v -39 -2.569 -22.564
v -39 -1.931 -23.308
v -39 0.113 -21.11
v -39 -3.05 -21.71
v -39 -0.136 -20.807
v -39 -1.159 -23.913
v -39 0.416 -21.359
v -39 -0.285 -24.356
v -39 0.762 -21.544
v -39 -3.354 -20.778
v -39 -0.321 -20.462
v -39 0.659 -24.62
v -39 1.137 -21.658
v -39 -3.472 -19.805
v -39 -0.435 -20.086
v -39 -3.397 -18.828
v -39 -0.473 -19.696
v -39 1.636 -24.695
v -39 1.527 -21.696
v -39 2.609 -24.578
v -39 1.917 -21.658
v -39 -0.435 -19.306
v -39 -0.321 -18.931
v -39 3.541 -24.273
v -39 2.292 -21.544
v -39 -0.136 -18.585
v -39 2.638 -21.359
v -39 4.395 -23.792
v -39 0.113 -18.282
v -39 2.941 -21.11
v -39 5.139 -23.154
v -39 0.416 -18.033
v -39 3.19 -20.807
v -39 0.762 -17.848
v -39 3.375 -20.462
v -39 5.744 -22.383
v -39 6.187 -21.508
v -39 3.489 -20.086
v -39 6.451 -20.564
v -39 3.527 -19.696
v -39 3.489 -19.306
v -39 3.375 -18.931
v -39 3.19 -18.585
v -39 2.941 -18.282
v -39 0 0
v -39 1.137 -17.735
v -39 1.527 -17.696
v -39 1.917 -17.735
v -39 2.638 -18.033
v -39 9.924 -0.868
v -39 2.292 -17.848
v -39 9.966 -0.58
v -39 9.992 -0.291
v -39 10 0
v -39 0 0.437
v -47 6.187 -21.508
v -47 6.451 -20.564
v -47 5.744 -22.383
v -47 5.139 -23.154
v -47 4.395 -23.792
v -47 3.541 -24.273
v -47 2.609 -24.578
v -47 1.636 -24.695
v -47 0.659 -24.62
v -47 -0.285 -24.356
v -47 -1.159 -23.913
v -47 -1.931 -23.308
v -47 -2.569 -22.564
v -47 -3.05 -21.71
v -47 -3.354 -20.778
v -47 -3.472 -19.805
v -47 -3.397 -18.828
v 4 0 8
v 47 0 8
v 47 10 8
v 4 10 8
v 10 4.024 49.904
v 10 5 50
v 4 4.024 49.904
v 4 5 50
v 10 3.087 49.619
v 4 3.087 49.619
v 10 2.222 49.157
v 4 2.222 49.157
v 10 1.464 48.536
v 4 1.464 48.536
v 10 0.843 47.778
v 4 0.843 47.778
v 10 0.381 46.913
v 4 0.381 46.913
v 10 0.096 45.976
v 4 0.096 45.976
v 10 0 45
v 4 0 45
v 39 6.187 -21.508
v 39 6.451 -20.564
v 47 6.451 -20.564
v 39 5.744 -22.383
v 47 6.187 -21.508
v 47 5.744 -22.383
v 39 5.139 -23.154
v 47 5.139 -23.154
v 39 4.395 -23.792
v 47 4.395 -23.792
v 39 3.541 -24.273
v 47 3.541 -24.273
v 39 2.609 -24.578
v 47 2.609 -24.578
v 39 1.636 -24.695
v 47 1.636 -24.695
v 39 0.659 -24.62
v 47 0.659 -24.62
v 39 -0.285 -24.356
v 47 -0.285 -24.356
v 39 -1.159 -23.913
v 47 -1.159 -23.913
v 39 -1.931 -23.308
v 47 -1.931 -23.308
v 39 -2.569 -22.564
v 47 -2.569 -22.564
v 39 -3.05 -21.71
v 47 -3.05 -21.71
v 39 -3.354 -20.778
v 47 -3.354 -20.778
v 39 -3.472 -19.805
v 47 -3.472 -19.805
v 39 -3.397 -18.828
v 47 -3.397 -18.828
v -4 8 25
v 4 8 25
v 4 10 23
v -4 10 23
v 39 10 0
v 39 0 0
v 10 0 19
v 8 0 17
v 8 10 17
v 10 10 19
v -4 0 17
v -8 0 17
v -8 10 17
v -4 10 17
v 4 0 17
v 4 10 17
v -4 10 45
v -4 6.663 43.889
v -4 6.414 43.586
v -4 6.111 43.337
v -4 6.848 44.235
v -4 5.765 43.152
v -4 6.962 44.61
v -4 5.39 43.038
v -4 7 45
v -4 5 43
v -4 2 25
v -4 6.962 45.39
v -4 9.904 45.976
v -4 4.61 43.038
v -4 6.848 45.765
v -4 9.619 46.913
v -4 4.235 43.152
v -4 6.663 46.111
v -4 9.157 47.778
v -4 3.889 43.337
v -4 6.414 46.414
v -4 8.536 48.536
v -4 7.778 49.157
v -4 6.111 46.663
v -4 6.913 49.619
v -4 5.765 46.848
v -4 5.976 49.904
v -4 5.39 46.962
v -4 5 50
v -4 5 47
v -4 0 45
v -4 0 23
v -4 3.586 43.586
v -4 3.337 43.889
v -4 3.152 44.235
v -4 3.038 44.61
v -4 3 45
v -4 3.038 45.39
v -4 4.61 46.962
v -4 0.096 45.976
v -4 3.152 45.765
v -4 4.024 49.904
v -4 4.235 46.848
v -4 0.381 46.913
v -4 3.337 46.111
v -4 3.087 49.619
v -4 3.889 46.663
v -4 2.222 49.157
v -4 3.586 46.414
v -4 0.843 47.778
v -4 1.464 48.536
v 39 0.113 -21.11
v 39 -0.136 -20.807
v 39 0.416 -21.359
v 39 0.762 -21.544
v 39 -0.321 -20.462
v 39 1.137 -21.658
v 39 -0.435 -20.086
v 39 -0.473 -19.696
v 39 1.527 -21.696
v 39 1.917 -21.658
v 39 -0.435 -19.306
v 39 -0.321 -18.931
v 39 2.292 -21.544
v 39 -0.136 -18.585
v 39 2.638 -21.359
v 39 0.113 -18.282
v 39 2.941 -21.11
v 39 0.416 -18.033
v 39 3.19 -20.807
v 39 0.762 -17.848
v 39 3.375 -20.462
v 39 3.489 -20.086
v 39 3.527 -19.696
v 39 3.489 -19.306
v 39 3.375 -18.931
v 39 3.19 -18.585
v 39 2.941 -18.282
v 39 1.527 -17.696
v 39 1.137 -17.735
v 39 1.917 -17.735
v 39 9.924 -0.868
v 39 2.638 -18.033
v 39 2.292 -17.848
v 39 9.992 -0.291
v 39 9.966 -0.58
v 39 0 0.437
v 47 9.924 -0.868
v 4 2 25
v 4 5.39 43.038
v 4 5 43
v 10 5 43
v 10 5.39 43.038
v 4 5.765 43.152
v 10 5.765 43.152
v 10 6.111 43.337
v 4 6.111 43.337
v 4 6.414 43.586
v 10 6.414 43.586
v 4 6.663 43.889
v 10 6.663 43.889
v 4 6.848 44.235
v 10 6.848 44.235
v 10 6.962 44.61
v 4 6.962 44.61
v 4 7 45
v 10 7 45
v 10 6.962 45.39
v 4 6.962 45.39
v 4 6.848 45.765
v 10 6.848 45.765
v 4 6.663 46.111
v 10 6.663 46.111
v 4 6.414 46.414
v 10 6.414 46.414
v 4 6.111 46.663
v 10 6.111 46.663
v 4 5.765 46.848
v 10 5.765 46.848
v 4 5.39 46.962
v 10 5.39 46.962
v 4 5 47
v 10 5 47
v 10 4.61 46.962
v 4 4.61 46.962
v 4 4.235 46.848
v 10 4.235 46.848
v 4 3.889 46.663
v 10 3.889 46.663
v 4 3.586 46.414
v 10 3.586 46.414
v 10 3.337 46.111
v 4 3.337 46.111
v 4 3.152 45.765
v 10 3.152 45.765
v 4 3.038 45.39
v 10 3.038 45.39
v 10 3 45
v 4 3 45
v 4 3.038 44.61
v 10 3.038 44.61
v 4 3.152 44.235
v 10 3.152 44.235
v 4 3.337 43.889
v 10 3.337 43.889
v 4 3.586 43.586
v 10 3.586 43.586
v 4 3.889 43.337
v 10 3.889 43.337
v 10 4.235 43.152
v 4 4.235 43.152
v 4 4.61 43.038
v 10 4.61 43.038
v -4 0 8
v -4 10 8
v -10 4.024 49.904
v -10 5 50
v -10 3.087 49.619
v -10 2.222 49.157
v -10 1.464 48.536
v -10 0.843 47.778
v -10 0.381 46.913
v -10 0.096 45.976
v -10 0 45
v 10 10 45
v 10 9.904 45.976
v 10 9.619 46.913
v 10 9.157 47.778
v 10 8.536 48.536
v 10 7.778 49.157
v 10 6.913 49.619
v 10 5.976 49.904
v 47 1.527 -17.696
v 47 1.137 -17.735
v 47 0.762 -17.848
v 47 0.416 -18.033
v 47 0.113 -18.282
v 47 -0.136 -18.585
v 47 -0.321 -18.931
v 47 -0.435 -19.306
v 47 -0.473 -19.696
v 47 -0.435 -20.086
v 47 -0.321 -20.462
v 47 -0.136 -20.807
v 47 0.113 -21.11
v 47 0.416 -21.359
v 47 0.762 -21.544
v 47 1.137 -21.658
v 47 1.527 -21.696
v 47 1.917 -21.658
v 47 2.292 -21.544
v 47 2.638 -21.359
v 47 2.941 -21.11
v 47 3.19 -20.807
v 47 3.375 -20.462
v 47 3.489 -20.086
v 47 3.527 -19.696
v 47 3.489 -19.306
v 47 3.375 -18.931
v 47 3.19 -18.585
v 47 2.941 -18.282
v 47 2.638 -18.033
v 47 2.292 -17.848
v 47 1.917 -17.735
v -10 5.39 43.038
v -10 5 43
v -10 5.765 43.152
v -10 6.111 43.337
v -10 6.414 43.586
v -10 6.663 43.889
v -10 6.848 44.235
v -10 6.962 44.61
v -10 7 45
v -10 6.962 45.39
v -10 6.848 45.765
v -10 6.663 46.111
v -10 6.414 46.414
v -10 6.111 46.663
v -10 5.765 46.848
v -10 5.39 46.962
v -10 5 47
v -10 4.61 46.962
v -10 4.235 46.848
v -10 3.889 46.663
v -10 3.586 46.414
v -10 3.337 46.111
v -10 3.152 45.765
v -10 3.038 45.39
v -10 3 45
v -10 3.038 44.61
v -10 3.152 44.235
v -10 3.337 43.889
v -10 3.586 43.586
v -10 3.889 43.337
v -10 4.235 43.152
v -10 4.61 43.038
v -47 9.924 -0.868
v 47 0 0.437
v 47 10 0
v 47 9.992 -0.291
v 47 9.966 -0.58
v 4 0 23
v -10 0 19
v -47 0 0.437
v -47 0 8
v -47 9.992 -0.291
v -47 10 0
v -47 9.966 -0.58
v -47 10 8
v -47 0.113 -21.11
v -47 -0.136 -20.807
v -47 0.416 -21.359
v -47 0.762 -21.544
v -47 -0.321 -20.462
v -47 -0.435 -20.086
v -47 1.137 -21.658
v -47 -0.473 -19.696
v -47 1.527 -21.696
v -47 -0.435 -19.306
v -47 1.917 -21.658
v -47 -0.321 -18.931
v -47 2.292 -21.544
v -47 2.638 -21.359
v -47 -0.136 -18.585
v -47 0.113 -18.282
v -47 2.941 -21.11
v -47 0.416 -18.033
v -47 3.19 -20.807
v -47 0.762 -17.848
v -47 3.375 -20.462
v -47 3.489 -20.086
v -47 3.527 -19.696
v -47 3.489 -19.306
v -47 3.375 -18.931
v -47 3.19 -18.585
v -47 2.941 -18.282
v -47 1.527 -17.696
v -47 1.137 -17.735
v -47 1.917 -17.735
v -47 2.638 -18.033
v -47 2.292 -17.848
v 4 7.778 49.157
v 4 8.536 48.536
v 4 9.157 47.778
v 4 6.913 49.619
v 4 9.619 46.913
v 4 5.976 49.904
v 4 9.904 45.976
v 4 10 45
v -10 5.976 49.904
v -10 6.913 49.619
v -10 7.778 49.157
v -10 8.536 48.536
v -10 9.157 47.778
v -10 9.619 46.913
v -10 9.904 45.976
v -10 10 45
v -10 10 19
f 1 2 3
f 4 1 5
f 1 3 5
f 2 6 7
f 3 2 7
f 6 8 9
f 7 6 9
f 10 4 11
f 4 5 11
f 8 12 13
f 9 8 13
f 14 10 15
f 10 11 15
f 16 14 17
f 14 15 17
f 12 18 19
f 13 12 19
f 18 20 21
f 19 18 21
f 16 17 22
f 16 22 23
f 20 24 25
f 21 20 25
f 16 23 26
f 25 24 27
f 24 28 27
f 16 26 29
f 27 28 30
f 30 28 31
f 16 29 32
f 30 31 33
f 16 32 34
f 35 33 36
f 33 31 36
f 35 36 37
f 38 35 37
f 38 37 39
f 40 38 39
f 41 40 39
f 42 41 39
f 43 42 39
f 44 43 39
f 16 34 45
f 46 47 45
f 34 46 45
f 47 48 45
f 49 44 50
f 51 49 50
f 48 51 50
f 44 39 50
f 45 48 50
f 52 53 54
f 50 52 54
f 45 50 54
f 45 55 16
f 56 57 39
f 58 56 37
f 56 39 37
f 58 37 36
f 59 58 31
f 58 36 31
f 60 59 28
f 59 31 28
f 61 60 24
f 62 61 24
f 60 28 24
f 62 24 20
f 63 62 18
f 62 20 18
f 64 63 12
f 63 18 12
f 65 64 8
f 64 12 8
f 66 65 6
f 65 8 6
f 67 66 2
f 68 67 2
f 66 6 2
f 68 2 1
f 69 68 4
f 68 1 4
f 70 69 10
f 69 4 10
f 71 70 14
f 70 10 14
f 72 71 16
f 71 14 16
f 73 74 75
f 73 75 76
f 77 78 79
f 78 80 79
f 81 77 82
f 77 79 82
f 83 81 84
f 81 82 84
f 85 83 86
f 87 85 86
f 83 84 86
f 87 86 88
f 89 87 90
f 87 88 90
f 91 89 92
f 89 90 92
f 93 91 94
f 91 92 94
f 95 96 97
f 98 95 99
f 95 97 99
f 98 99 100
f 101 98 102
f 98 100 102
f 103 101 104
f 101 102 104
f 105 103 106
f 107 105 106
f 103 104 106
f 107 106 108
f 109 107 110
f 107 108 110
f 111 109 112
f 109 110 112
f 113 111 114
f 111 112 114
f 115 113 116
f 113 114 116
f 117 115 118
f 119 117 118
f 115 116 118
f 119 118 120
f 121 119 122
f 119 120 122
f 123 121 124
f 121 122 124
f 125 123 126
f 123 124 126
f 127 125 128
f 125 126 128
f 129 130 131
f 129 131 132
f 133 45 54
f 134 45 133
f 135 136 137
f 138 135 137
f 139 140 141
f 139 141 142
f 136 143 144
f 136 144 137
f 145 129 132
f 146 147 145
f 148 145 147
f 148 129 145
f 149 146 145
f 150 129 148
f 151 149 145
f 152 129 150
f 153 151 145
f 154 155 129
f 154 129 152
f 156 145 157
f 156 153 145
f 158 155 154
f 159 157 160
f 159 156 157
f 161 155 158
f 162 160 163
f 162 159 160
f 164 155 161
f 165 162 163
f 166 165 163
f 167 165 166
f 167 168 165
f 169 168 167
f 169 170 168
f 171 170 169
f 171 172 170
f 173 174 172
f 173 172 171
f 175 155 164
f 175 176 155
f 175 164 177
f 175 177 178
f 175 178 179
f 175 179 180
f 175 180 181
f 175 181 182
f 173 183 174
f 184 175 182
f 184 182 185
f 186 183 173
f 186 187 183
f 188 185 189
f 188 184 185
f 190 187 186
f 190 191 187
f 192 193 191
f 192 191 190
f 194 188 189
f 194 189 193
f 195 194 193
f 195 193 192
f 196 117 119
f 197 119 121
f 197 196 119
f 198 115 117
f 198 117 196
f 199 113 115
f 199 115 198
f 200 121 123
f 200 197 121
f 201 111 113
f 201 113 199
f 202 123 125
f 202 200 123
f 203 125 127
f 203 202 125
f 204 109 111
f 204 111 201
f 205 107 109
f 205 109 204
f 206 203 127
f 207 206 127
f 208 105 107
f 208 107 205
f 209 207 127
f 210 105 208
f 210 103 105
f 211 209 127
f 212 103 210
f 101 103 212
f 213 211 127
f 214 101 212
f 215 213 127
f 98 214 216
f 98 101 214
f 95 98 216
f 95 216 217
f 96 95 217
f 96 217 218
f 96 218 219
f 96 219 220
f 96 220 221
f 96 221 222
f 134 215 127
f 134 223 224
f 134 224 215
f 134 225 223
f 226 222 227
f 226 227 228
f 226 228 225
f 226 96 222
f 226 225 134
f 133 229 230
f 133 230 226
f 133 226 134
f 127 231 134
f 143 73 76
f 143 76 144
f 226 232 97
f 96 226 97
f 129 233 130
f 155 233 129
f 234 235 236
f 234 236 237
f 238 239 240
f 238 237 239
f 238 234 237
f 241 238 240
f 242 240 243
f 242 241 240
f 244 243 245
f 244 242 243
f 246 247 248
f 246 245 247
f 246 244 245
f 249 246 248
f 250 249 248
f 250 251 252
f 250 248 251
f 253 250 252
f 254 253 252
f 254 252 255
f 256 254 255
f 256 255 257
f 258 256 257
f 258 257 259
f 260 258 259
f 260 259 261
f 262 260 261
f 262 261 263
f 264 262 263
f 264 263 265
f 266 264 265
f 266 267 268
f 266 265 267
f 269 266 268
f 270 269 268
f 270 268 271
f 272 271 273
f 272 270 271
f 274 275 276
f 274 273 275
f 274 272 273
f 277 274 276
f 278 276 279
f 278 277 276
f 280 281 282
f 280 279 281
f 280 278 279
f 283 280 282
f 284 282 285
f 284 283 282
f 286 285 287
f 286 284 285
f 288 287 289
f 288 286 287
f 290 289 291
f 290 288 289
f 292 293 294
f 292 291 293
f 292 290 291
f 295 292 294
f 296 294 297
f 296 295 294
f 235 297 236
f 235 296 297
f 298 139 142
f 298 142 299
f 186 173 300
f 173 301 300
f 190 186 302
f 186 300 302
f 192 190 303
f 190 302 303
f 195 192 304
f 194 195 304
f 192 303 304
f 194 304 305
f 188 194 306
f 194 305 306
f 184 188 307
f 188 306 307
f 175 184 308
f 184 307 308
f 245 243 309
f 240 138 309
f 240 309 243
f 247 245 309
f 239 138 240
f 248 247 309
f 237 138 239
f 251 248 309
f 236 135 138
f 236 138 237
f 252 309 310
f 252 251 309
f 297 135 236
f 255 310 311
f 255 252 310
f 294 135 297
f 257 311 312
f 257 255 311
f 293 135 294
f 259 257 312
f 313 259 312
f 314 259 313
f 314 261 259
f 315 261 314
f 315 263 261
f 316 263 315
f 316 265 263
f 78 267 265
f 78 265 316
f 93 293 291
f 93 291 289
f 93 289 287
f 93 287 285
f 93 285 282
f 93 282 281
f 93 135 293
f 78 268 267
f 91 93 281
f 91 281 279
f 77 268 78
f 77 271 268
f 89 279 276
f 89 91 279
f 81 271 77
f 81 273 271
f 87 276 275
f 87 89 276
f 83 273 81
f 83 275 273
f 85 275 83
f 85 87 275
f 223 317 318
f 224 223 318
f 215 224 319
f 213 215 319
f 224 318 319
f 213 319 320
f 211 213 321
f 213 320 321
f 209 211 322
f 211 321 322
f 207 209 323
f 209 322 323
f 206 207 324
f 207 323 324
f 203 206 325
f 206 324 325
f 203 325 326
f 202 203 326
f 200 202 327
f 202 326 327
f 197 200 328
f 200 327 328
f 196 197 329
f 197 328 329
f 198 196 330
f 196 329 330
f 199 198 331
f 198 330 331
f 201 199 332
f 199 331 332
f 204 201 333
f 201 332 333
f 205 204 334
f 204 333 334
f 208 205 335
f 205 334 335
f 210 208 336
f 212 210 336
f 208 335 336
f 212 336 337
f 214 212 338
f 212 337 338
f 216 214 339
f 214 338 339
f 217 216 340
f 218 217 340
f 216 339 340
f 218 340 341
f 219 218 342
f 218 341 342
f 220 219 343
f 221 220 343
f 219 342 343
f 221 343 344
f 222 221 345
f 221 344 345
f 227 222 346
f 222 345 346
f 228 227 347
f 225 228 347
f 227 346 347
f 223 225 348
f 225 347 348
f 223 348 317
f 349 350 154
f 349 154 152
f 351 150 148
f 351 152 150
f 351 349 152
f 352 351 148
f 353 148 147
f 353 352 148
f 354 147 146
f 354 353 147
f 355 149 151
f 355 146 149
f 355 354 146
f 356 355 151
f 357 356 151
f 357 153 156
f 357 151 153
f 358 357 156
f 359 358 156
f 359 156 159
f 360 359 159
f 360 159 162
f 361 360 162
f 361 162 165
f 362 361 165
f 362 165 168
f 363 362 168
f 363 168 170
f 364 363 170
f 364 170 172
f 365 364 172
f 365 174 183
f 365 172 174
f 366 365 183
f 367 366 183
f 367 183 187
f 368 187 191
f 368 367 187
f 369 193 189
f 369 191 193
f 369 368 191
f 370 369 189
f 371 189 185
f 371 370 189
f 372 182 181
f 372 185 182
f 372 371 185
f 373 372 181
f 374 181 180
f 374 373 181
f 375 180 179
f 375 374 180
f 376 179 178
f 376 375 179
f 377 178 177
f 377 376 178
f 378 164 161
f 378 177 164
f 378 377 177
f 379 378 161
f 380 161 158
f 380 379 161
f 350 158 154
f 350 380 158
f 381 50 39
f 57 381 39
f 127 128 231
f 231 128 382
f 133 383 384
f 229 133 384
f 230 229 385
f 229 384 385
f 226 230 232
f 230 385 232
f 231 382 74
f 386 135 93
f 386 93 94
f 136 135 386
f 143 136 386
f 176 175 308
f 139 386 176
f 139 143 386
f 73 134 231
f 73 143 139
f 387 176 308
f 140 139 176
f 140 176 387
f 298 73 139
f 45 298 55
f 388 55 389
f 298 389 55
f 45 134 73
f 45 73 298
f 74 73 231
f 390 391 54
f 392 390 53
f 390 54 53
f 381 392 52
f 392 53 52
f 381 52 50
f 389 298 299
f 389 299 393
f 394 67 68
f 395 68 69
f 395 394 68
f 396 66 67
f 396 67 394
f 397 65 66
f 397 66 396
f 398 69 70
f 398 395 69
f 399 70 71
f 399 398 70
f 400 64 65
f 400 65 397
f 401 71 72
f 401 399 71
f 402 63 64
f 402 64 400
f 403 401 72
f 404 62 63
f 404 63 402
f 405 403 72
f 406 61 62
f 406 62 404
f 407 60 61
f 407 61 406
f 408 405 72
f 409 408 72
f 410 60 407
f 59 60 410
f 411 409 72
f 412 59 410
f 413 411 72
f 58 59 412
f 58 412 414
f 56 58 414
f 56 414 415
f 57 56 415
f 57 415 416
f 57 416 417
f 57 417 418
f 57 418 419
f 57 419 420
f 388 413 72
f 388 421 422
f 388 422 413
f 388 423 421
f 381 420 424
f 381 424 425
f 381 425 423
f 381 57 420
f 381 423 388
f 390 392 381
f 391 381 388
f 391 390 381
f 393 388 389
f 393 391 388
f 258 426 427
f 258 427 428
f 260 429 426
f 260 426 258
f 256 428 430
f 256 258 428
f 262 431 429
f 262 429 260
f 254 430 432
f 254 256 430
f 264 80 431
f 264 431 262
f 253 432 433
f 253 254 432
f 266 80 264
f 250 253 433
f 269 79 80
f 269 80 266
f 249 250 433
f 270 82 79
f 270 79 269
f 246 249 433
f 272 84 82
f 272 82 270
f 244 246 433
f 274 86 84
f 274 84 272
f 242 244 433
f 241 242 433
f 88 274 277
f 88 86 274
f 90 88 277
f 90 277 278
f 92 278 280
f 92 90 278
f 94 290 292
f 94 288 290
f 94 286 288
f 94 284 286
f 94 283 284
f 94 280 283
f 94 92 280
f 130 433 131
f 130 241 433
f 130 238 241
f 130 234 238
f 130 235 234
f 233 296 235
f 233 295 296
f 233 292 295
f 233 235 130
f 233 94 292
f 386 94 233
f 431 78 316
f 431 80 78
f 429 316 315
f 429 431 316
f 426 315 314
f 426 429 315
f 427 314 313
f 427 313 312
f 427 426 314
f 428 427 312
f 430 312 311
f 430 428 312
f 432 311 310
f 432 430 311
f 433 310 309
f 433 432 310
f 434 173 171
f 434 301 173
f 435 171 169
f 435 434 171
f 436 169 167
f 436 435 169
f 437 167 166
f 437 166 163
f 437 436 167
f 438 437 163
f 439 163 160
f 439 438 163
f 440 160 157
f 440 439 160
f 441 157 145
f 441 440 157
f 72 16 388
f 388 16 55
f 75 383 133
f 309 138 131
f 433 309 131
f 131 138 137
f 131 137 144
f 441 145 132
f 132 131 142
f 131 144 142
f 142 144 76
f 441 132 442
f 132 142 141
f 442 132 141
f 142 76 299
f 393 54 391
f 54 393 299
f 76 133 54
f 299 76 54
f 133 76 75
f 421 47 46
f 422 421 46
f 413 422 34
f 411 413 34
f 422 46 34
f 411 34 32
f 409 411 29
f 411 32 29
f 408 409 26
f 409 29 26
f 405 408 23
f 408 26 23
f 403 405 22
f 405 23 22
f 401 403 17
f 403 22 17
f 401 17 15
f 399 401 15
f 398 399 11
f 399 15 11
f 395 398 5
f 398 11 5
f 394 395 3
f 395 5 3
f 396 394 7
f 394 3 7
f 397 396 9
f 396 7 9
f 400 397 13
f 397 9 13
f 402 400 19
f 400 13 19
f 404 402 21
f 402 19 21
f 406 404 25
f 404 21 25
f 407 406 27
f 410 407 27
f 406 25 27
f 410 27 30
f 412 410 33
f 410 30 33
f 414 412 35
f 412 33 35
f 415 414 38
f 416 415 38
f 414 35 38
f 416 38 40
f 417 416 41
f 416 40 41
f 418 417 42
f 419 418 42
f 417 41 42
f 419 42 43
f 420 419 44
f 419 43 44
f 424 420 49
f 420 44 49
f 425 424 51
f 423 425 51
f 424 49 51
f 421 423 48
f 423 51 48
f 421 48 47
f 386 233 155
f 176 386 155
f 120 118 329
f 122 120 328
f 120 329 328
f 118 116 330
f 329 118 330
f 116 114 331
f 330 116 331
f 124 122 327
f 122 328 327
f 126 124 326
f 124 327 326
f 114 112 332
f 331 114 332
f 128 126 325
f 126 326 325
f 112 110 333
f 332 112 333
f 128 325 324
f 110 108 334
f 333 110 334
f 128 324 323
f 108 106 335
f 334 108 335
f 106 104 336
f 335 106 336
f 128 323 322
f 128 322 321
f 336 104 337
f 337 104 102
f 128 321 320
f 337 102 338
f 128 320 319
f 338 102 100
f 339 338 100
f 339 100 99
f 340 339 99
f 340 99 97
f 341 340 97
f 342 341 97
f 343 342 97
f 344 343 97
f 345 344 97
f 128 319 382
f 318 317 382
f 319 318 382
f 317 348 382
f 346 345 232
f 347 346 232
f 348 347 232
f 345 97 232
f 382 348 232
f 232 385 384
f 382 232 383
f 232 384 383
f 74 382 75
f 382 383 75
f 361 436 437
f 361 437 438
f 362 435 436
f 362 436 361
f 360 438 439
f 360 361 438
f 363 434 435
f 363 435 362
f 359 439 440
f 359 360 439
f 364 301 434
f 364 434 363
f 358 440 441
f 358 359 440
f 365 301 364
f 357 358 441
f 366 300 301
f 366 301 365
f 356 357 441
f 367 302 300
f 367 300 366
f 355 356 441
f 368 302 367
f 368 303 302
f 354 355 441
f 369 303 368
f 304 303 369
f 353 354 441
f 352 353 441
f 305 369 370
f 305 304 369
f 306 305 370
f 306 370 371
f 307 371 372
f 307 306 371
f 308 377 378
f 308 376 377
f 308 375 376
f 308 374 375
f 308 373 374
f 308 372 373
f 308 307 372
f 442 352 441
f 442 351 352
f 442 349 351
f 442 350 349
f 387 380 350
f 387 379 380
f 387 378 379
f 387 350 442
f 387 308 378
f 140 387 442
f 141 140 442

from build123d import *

# Parameters (mm, degrees)
EXTRUDE_1_DEPTH          = 10
FILLET_1_R               = 5
EXTRUDE_START            = 47
SKETCH_6_R               = 2
EXTRUDE_2_DEPTH          = 8
EXTRUDE_START_2          = -39
SKETCH_6_2_R             = 2
EXTRUDE_3_DEPTH          = 8
CUT_EXTRUDE_4_DEPTH      = 70.34695379
CUT_EXTRUDE_4_DEPTH_BACK = 70.34695379
SKETCH_7_R               = 2
CHAMFER_1_SIZE           = 2
CHAMFER_2_SIZE           = 2


with BuildPart() as part:
    # 草图1 → 凸台-拉伸1 (new body)
    with BuildSketch(Plane(origin=(0, 0, 0), x_dir=(1, 0, 0), z_dir=(0, 1, 0))):
        Polygon((-4, -50), (-10, -50), (-10, -17), (-4, -17), (-4, -8), (-47, -8), (-47, 0), (47, 0), (47, -8), (4, -8), (4, -17), (10, -17), (10, -50), (4, -50), (4, -25), (-4, -25), align=None)
    extrude(amount=EXTRUDE_1_DEPTH)

    # 圆角1
    fillet_1_edges = [part.edges().sort_by_distance(p)[0] for p in [
        (-7, 0, 50),
        (-7, 10, 50),
        (7, 10, 50),
        (7, 0, 50),
    ]]
    fillet(fillet_1_edges, radius=FILLET_1_R - 0.0001)  # a hair under: the kernel refuses the full size

    # 草图6 → 凸台-拉伸2 (add)
    with BuildSketch(Plane(origin=(0, 0, 0), x_dir=(0, 0, -1), z_dir=(1, 0, 0)).offset(EXTRUDE_START)):
        with BuildLine():
            Line((0.868240888, 9.924038765), (20.564395949, 6.451075212))
            ThreePointArc((20.564395949, 6.451075212), (24.620193825, 0.658795558), (18.827914172, -3.397002318))
            Line((18.827914172, -3.397002318), (-0.868240888, 0.075961235))
            ThreePointArc((-0.868240888, 0.075961235), (-4.924038765, 5.868240888), (0.868240888, 9.924038765))
        make_face()
        with Locations(Location((19.69615506, 1.527036447, 0), (0, 0, 180))):
            Circle(SKETCH_6_R, mode=Mode.SUBTRACT)
    extrude(amount=-EXTRUDE_2_DEPTH)

    # 草图6<2> → 凸台-拉伸3 (add)
    with BuildSketch(Plane(origin=(0, 0, 0), x_dir=(0, 0, -1), z_dir=(1, 0, 0)).offset(EXTRUDE_START_2)):
        with BuildLine():
            Line((0.868240888, 9.924038765), (20.564395949, 6.451075212))
            ThreePointArc((20.564395949, 6.451075212), (24.620193825, 0.658795558), (18.827914172, -3.397002318))
            Line((18.827914172, -3.397002318), (-0.868240888, 0.075961235))
            ThreePointArc((-0.868240888, 0.075961235), (-4.924038765, 5.868240888), (0.868240888, 9.924038765))
        make_face()
        with Locations(Location((19.69615506, 1.527036447, 0), (0, 0, 180))):
            Circle(SKETCH_6_2_R, mode=Mode.SUBTRACT)
    extrude(amount=-EXTRUDE_3_DEPTH)

    # 草图7 → 切除-拉伸4 (cut, two sides: drawn at the far end of the back side and taken through both)
    with BuildSketch(Plane(origin=(0, 0, 0), x_dir=(0, 0, -1), z_dir=(1, 0, 0)).offset(-CUT_EXTRUDE_4_DEPTH_BACK)):
        with Locations((-45, 5)):
            Circle(SKETCH_7_R)
    extrude(amount=CUT_EXTRUDE_4_DEPTH + CUT_EXTRUDE_4_DEPTH_BACK, mode=Mode.SUBTRACT)

    # 倒角1
    chamfer_1_edges = [part.edges().sort_by_distance(p)[0] for p in [
        (0, 0, 25),
        (0, 10, 25),
    ]]
    chamfer(chamfer_1_edges, length=CHAMFER_1_SIZE)

    # 倒角2
    chamfer_2_edges = [part.edges().sort_by_distance(p)[0] for p in [
        (10, 5, 17),
        (-10, 5, 17),
    ]]
    chamfer(chamfer_2_edges, length=CHAMFER_2_SIZE)


solid = part.part
